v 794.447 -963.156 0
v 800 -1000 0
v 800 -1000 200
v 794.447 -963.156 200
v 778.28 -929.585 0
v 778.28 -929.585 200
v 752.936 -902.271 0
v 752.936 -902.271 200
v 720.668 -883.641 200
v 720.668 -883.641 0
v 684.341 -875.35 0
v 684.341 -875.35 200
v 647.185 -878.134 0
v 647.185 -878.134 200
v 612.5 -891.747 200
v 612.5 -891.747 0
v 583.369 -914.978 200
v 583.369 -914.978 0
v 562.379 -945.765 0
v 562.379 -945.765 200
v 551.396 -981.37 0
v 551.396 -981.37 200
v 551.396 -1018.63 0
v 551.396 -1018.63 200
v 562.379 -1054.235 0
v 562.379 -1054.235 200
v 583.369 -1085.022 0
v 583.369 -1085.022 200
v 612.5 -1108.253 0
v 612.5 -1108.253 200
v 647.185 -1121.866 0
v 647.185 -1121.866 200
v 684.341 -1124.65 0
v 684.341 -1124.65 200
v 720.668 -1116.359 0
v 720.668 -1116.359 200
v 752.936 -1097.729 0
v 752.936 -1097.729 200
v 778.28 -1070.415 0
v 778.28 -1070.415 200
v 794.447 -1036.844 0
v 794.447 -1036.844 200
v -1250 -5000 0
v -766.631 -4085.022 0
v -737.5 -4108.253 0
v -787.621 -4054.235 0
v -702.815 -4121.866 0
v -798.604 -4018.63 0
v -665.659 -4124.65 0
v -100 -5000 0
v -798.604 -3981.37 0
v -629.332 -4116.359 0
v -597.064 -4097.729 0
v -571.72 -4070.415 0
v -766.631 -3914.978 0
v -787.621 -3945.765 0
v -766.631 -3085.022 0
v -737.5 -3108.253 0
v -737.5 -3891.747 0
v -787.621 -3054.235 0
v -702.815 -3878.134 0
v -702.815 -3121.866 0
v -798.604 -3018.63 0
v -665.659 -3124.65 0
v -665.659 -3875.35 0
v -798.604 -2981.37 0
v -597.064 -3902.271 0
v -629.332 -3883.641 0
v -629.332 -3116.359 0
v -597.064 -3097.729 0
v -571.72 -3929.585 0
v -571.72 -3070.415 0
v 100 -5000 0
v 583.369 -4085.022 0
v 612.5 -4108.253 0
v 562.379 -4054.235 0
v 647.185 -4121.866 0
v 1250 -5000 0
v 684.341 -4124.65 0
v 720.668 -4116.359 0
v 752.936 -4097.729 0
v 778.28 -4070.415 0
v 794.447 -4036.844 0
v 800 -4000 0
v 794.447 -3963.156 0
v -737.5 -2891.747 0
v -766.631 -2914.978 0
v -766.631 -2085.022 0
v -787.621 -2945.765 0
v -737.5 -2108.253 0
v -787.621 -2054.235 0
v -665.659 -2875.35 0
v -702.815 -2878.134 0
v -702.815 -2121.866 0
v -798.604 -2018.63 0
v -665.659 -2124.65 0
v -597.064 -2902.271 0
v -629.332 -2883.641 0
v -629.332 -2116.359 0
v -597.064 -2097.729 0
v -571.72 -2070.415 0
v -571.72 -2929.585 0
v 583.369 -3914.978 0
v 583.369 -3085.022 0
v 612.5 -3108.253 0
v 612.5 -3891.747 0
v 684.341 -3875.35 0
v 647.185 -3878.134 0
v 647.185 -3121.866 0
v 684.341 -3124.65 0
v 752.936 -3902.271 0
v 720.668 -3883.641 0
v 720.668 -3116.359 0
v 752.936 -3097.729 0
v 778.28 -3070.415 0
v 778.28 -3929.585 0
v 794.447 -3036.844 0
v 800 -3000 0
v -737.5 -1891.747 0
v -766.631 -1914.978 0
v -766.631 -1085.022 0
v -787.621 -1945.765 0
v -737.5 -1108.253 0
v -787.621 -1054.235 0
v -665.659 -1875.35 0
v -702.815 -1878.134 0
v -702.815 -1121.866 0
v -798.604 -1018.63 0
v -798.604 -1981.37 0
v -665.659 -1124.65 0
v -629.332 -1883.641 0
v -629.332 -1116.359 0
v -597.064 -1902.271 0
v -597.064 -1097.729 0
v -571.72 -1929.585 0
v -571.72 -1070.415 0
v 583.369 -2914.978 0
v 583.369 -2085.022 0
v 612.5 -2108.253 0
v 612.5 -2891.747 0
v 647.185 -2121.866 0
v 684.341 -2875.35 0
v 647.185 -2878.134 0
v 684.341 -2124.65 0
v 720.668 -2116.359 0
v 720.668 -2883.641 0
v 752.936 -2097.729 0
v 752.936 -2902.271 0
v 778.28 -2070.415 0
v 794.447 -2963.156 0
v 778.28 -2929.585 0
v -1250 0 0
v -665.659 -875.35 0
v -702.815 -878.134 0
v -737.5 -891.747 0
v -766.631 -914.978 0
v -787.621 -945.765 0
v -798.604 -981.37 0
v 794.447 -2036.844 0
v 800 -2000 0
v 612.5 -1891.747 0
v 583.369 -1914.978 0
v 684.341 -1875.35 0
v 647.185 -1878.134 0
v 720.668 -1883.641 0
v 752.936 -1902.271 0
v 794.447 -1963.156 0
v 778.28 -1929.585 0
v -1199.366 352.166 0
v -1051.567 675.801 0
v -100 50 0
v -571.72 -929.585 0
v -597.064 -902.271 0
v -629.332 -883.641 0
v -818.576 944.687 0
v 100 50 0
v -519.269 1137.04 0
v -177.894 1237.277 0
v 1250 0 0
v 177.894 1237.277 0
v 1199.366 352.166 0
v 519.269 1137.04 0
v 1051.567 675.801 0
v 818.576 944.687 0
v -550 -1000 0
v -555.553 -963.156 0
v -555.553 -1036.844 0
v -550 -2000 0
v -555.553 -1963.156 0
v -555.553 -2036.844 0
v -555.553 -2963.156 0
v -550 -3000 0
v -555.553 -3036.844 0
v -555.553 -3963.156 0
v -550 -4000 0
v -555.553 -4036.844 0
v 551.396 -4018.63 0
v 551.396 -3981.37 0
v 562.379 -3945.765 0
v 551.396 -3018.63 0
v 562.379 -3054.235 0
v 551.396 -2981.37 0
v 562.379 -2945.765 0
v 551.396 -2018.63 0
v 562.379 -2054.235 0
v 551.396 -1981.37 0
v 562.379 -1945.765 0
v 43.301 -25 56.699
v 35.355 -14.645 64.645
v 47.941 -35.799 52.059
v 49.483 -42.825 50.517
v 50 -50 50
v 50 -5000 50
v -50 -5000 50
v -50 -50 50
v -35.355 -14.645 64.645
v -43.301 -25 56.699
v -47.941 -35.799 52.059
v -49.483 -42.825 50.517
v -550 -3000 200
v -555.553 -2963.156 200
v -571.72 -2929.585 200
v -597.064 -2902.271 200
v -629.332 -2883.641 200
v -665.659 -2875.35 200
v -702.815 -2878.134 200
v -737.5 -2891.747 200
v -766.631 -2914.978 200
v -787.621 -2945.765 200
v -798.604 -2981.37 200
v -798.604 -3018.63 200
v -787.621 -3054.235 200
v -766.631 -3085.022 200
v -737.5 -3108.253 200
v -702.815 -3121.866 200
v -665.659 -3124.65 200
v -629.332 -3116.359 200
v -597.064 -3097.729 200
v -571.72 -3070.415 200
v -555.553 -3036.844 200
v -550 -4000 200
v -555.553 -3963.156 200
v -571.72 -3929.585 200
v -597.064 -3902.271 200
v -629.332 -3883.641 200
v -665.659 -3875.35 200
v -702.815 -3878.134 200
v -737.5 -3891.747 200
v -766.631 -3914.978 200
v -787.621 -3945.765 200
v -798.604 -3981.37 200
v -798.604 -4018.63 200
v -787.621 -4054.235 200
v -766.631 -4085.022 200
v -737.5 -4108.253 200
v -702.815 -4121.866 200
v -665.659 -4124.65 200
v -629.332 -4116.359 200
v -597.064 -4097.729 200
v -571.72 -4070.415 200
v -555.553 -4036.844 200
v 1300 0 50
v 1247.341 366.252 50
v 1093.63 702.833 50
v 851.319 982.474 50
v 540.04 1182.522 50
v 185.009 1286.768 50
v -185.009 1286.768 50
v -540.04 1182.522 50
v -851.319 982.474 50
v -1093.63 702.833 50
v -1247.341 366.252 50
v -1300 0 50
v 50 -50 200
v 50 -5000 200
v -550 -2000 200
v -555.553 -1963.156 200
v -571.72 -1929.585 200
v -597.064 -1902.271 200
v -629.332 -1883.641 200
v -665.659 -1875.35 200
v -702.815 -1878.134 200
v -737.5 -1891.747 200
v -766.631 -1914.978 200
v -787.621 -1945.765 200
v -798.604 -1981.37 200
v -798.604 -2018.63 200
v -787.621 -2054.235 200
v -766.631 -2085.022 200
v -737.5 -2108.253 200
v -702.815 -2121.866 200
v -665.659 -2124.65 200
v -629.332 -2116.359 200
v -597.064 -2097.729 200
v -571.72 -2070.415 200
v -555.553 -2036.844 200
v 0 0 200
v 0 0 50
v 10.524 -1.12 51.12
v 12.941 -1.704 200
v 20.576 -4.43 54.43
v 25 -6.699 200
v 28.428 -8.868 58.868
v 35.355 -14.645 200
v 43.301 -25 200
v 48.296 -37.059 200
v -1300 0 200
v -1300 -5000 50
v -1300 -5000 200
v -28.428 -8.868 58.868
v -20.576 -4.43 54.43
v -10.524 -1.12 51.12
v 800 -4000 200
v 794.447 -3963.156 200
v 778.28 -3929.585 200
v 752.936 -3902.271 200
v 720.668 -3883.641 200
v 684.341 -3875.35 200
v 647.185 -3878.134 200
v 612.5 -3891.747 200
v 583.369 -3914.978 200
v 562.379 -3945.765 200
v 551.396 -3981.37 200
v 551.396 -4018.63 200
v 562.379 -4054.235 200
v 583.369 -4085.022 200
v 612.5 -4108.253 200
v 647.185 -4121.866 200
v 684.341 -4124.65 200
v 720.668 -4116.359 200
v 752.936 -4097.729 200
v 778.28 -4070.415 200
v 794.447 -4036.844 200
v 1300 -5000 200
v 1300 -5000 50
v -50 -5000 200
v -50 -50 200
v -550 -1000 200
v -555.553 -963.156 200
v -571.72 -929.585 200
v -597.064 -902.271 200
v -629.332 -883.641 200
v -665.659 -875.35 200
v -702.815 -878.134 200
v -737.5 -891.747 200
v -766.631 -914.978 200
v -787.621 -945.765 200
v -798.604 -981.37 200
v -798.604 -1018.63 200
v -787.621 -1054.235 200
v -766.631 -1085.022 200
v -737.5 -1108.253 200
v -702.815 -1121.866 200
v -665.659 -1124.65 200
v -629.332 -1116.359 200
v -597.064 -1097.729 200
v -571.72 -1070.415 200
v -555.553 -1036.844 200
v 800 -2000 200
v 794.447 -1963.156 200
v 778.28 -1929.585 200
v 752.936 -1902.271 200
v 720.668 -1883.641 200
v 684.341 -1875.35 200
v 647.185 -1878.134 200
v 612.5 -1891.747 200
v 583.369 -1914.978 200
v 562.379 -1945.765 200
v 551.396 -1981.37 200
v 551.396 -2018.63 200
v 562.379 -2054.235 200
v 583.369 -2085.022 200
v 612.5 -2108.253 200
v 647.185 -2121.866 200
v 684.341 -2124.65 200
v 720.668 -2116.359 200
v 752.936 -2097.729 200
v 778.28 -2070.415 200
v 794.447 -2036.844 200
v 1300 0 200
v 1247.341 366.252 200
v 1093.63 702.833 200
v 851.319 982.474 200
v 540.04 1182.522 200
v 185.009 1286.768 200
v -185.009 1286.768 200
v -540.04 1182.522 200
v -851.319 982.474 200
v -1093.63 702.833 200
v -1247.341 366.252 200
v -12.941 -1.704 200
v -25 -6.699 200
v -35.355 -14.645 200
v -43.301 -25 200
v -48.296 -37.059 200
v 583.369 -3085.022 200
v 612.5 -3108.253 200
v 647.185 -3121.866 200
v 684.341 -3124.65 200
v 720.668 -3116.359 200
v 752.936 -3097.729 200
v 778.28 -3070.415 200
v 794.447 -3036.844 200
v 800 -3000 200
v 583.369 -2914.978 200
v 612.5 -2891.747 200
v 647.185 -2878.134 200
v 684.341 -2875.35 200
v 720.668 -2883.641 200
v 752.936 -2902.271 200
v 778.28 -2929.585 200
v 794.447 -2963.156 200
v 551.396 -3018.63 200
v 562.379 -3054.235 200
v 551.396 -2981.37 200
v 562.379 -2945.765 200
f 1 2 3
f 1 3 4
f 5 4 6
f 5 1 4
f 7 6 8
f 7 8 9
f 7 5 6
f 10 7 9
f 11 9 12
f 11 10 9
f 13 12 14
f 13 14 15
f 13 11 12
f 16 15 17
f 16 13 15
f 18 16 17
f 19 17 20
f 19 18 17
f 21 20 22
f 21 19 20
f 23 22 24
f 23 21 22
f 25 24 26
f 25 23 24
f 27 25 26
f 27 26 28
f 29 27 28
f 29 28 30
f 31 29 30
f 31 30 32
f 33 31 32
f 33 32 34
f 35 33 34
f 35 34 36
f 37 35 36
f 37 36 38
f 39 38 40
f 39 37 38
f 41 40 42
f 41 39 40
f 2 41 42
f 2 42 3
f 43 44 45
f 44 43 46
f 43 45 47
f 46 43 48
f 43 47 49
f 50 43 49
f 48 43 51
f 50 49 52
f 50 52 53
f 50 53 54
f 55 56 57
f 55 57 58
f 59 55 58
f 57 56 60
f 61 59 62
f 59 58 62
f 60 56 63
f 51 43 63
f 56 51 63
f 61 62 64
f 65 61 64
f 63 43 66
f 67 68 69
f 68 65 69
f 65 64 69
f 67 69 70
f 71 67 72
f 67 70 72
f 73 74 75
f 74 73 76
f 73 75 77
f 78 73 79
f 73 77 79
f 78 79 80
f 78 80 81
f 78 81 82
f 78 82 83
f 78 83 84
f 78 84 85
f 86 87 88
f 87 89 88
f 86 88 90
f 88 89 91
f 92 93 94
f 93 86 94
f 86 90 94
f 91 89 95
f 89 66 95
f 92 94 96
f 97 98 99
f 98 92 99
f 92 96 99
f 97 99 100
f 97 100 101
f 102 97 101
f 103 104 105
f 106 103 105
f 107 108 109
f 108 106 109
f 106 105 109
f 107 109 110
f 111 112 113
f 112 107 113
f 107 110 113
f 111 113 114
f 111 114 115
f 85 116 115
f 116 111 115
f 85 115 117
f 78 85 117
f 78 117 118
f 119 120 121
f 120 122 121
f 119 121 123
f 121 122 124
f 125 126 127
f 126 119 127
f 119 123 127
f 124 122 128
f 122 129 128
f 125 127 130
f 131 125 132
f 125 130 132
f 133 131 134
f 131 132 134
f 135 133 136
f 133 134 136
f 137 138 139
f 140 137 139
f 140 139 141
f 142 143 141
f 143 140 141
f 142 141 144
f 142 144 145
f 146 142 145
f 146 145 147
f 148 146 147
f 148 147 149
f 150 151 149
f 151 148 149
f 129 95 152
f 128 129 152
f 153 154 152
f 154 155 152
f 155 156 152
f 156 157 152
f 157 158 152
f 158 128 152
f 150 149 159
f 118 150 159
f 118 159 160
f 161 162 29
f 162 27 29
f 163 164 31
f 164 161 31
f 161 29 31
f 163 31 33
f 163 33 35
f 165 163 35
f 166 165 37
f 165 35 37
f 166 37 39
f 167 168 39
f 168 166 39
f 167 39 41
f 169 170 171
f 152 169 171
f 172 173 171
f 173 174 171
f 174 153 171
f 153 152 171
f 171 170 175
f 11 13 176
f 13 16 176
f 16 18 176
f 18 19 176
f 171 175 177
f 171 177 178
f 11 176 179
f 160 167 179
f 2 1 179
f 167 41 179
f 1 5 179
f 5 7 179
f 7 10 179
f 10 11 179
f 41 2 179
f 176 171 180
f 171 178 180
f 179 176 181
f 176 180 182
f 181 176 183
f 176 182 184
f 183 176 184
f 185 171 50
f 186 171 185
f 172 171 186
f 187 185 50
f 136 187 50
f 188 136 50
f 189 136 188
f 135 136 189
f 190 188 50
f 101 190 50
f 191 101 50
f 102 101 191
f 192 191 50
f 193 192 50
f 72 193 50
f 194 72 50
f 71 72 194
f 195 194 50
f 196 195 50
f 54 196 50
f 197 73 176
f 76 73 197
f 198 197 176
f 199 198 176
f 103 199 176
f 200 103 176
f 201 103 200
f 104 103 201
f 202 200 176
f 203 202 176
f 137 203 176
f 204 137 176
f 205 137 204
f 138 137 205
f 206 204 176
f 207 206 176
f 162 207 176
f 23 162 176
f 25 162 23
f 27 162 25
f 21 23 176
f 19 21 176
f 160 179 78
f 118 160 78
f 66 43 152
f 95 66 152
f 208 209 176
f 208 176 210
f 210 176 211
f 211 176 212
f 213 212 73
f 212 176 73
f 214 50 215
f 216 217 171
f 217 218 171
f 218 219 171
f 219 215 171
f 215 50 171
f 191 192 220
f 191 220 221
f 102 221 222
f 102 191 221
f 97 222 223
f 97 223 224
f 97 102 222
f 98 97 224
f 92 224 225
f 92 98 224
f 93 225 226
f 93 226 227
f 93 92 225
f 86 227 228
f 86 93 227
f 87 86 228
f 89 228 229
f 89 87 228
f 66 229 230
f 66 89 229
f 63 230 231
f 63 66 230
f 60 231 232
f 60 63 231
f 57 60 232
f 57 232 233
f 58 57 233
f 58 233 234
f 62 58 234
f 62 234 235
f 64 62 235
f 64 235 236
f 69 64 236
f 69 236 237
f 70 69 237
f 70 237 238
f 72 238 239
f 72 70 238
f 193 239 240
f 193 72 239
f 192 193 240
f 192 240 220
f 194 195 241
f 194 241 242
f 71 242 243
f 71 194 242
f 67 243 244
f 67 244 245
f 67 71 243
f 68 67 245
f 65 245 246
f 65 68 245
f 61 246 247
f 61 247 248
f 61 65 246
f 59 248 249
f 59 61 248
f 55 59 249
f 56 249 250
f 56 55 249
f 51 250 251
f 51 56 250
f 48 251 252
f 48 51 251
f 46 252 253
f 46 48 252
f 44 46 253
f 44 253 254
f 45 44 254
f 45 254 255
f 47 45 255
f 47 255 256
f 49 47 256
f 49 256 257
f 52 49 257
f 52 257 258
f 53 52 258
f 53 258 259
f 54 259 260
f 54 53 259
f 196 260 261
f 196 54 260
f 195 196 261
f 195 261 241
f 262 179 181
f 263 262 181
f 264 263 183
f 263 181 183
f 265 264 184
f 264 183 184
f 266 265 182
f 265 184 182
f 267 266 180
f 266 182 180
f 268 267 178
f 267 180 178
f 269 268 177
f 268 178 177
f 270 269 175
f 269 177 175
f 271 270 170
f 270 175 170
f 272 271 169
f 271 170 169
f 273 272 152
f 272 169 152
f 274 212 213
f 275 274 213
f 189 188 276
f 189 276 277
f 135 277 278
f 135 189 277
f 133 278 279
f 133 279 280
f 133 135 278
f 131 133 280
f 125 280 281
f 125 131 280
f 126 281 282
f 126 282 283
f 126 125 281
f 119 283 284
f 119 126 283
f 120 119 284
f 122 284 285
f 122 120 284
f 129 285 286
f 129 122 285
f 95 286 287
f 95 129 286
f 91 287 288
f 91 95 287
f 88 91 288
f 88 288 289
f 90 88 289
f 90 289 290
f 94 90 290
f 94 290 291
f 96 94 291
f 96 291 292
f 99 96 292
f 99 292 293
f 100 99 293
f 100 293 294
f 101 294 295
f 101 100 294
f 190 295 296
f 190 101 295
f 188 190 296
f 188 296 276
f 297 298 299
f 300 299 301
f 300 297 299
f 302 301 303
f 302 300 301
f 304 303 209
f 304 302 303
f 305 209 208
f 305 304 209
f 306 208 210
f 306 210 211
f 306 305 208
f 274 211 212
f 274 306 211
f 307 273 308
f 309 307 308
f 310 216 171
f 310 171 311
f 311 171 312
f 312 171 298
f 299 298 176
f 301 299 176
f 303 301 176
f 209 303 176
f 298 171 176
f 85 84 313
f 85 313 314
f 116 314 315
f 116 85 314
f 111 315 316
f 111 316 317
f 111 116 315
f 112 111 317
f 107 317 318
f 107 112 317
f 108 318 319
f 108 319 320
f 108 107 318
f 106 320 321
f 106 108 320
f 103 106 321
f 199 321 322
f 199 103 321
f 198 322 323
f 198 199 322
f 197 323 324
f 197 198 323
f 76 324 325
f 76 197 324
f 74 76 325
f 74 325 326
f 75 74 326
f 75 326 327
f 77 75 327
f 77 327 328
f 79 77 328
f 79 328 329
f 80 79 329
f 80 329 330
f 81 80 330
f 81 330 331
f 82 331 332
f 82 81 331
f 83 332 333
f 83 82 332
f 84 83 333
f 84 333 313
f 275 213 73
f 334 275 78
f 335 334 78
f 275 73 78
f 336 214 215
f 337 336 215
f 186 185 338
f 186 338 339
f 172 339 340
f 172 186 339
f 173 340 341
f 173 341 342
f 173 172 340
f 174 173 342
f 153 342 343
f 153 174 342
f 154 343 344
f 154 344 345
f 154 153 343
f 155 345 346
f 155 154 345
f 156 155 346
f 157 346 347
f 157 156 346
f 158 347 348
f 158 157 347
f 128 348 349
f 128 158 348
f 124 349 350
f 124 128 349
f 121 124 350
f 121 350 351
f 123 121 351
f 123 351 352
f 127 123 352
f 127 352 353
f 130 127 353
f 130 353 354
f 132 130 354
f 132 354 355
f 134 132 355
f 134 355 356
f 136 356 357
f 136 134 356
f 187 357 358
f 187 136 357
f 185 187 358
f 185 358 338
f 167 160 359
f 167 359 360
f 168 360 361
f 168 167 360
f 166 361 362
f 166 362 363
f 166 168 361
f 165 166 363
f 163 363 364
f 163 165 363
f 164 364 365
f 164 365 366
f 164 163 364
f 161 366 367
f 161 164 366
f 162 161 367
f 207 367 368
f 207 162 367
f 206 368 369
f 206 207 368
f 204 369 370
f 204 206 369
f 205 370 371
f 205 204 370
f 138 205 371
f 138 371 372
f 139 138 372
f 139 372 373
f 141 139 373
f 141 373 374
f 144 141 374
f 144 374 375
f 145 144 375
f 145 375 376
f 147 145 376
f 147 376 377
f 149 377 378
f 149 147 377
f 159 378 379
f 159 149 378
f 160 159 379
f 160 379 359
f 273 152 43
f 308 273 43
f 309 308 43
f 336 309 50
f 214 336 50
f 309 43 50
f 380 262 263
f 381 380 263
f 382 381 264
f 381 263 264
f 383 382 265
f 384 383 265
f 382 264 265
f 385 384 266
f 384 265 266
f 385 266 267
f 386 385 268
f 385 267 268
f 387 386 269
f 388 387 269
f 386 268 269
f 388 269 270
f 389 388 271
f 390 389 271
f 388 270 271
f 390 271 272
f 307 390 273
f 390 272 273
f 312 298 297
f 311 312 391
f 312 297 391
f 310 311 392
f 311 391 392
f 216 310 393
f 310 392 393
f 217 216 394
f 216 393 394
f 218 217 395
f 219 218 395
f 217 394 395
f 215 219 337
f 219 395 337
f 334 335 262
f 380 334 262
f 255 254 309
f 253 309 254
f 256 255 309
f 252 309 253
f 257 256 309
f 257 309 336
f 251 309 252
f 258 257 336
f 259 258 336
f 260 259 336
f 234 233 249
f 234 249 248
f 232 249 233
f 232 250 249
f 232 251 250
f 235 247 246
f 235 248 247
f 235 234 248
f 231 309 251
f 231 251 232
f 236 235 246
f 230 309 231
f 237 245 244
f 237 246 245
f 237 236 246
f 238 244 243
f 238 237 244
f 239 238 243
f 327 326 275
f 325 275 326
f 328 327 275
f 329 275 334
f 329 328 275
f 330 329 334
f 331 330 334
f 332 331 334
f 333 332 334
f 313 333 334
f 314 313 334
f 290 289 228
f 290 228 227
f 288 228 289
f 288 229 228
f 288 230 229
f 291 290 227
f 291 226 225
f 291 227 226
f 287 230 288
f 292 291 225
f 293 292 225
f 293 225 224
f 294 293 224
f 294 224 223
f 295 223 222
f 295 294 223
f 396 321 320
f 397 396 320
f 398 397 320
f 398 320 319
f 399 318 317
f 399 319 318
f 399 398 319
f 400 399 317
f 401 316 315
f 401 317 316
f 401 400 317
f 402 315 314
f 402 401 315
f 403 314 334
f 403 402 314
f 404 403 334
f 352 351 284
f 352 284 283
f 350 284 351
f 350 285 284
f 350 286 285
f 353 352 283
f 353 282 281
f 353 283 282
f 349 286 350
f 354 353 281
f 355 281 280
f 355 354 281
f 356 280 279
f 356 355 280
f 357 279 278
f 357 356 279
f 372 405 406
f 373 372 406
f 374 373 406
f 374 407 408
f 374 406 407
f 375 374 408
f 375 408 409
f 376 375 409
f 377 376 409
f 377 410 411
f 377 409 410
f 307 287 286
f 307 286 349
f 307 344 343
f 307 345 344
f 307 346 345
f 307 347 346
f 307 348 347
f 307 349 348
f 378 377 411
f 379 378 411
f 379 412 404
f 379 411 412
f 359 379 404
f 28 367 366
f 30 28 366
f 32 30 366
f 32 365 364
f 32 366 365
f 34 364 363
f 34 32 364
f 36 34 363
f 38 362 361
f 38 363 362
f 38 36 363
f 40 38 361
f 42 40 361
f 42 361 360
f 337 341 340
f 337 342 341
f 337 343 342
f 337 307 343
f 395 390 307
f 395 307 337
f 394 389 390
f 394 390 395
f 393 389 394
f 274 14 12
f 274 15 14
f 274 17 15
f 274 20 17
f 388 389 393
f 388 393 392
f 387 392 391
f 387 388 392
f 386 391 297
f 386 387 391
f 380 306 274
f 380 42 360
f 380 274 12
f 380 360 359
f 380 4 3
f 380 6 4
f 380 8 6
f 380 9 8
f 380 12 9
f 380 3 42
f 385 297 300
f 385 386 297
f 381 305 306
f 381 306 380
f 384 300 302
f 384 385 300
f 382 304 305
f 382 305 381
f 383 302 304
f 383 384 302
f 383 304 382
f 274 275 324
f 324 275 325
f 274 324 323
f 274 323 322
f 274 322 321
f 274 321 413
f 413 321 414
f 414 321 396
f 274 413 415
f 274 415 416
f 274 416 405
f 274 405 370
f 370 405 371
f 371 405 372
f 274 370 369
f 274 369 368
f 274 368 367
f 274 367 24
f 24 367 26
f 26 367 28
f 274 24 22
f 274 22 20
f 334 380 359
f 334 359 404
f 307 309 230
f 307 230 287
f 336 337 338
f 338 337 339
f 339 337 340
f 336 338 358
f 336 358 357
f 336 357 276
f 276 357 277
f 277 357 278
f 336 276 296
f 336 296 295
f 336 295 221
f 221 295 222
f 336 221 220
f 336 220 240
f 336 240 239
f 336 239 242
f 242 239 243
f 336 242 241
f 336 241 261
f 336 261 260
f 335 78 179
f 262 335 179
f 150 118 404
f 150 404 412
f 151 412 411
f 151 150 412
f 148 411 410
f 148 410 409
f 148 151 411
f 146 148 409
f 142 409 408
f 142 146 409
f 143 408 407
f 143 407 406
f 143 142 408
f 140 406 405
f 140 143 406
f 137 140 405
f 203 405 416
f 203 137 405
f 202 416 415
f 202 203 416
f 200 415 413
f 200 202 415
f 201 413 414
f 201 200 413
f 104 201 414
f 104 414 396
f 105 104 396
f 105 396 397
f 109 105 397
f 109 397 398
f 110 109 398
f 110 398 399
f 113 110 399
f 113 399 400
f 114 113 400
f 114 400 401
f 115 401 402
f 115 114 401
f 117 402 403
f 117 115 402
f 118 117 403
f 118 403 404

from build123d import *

# Parameters (mm, degrees)
F0_R     = 125
F1_DEPTH = 200
F2_SIZE  = 50
F3_R     = 49.99999


# Not quite as in the source:
# - a fillet or chamfer is up to 0.001 mm smaller than in the source, because OpenCascade refuses the exact size


with BuildPart() as f1:
    # F0 (on Top) → F1 (new body)
    with BuildSketch(Plane.XY):
        with BuildLine():
            Line((-50, 0), (0, 0))
            Line((0, 0), (50, 0))
            Line((50, 0), (50, -5000))
            Line((50, -5000), (1300, -5000))
            Line((1300, -5000), (1300, 0))
            ThreePointArc((1300, 0), (0, 1300), (-1300, 0))
            Line((-1300, 0), (-1300, -5000))
            Line((-1300, -5000), (-50, -5000))
            Line((-50, -5000), (-50, 0))
        make_face()
        with Locations((-675, -4000)):
            Circle(F0_R, mode=Mode.SUBTRACT)
        with Locations((-675, -3000)):
            Circle(F0_R, mode=Mode.SUBTRACT)
        with Locations((-675, -2000)):
            Circle(F0_R, mode=Mode.SUBTRACT)
        with Locations((675, -4000)):
            Circle(F0_R, mode=Mode.SUBTRACT)
        with Locations((675, -3000)):
            Circle(F0_R, mode=Mode.SUBTRACT)
        with Locations((675, -2000)):
            Circle(F0_R, mode=Mode.SUBTRACT)
        with Locations((-675, -1000)):
            Circle(F0_R, mode=Mode.SUBTRACT)
        with Locations((675, -1000)):
            Circle(F0_R, mode=Mode.SUBTRACT)
    extrude(amount=F1_DEPTH)

    # F2
    f2_edges = [f1.edges().sort_by_distance(p)[0] for p in [
        (1300, -2500, 0),
        (0, 1300, 0),
        (-1300, -2500, 0),
        (50, -2500, 0),
        (-50, -2500, 0),
        (0, 0, 0),
    ]]
    chamfer(f2_edges, length=F2_SIZE)

    # F3 (radius 50 in the source; OpenCascade refuses exactly that, so slightly less here)
    f3_edges = [f1.edges().sort_by_distance(p)[0] for p in [
        (-50, 0, 125),
        (50, 0, 125),
    ]]
    fillet(f3_edges, radius=F3_R)


solid = f1.part
